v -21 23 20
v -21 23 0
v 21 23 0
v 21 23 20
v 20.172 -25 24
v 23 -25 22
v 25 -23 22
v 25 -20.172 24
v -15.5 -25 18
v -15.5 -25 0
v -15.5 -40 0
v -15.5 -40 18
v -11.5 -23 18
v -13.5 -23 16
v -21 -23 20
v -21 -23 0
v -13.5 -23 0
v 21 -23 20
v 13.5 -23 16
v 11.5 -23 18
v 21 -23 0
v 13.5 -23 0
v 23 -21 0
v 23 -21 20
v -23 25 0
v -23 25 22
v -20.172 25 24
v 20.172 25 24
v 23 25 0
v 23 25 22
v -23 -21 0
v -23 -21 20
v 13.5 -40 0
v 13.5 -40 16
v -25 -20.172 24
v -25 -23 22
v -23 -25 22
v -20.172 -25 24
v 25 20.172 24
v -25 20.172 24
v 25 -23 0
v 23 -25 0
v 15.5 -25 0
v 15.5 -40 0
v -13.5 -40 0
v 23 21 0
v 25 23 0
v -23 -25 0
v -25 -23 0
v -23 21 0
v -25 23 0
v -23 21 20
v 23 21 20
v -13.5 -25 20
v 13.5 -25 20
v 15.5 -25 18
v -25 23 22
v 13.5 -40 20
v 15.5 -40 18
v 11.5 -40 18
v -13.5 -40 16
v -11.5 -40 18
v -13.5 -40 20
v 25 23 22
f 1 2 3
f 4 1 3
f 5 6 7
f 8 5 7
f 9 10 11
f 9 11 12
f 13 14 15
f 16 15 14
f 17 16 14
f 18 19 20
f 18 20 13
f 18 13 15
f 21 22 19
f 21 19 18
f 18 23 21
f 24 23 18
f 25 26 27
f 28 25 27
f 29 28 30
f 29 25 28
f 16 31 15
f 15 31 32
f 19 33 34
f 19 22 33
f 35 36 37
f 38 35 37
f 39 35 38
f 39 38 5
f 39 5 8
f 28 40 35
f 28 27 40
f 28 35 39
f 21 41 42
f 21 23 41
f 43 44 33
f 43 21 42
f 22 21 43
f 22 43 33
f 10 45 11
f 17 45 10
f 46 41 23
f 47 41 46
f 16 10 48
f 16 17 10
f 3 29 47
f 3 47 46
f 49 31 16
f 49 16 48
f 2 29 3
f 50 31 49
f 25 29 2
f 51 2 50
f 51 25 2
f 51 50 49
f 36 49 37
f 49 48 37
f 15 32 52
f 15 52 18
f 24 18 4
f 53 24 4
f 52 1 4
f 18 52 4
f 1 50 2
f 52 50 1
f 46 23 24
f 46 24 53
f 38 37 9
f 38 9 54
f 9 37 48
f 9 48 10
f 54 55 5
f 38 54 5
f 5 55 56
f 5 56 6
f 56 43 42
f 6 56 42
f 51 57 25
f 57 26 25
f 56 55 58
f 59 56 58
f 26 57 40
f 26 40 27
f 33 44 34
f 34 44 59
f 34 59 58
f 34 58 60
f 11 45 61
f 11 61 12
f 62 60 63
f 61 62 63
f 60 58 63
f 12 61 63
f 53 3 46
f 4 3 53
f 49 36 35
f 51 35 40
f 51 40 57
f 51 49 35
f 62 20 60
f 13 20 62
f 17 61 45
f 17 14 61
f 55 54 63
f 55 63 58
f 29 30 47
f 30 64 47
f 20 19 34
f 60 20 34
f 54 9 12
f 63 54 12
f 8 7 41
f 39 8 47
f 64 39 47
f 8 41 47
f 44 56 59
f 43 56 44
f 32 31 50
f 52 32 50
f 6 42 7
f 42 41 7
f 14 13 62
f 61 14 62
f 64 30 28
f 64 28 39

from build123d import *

# Parameters (mm, degrees)
SKETCH_W        = 50
SKETCH_H        = 50
SKETCH_W_2      = 46
SKETCH_H_2      = 46
PAD_DEPTH       = 20
SKETCH001_W     = 50
SKETCH001_H     = 50
PAD001_DEPTH    = 4
SKETCH002_W     = 27
SKETCH002_H     = 18
POCKET_DEPTH    = 5
CHAMFER_SIZE    = 2
CHAMFER001_SIZE = 2
PAD002_DEPTH    = 15
CHAMFER002_SIZE = 2


with BuildPart() as part:
    # Sketch → Pad (new body)
    with BuildSketch(Plane.XY):
        Rectangle(SKETCH_W, SKETCH_H)
        Rectangle(SKETCH_W_2, SKETCH_H_2, mode=Mode.SUBTRACT)
    extrude(amount=PAD_DEPTH)

    # Sketch001 (on Face10 of Pad) → Pad001 (join)
    with BuildSketch(Plane.XY.offset(20)):
        Rectangle(SKETCH001_W, SKETCH001_H)
    extrude(amount=PAD001_DEPTH)

    # Sketch002 (on Face6 of Pad001) → Pocket (cut)
    with BuildSketch(Plane.XZ.offset(25)):
        with Locations((0, 9)):
            Rectangle(SKETCH002_W, SKETCH002_H)
    extrude(amount=-POCKET_DEPTH, mode=Mode.SUBTRACT)

    # Chamfer
    chamfer_edges = [part.edges().sort_by_distance(p)[0] for p in [
        (-25, -25, 22),
        (-25, -25, 10),
        (25, -25, 10),
        (25, -25, 22),
        (25, 25, 10),
        (25, 25, 22),
        (-25, 25, 10),
        (-25, 25, 22),
        (-23, 23, 10),
        (23, -23, 10),
        (23, 23, 10),
        (-23, -23, 10),
    ]]
    chamfer(chamfer_edges, length=CHAMFER_SIZE)

    # Chamfer001
    chamfer001_edges = [part.edges().sort_by_distance(p)[0] for p in [
        (24, -24, 24),
        (-24, -24, 24),
        (24, 24, 24),
        (-24, 24, 24),
    ]]
    chamfer(chamfer001_edges, length=CHAMFER001_SIZE)

    # Sketch003 (on Face19 of Chamfer001) → Pad002 (join)
    with BuildSketch(Plane.XZ.offset(25)):
        Polygon((-13.5, 18), (-13.5, 0), (-15.5, 0), (-15.5, 20), (15.5, 20), (15.5, 0), (13.5, 0), (13.5, 18), align=None)
    extrude(amount=PAD002_DEPTH)

    # Chamfer002
    chamfer002_edges = [part.edges().sort_by_distance(p)[0] for p in [
        (13.5, -32.5, 18),
        (-13.5, -32.5, 18),
        (15.5, -32.5, 20),
        (-15.5, -32.5, 20),
    ]]
    chamfer(chamfer002_edges, length=CHAMFER002_SIZE)


solid = part.part
